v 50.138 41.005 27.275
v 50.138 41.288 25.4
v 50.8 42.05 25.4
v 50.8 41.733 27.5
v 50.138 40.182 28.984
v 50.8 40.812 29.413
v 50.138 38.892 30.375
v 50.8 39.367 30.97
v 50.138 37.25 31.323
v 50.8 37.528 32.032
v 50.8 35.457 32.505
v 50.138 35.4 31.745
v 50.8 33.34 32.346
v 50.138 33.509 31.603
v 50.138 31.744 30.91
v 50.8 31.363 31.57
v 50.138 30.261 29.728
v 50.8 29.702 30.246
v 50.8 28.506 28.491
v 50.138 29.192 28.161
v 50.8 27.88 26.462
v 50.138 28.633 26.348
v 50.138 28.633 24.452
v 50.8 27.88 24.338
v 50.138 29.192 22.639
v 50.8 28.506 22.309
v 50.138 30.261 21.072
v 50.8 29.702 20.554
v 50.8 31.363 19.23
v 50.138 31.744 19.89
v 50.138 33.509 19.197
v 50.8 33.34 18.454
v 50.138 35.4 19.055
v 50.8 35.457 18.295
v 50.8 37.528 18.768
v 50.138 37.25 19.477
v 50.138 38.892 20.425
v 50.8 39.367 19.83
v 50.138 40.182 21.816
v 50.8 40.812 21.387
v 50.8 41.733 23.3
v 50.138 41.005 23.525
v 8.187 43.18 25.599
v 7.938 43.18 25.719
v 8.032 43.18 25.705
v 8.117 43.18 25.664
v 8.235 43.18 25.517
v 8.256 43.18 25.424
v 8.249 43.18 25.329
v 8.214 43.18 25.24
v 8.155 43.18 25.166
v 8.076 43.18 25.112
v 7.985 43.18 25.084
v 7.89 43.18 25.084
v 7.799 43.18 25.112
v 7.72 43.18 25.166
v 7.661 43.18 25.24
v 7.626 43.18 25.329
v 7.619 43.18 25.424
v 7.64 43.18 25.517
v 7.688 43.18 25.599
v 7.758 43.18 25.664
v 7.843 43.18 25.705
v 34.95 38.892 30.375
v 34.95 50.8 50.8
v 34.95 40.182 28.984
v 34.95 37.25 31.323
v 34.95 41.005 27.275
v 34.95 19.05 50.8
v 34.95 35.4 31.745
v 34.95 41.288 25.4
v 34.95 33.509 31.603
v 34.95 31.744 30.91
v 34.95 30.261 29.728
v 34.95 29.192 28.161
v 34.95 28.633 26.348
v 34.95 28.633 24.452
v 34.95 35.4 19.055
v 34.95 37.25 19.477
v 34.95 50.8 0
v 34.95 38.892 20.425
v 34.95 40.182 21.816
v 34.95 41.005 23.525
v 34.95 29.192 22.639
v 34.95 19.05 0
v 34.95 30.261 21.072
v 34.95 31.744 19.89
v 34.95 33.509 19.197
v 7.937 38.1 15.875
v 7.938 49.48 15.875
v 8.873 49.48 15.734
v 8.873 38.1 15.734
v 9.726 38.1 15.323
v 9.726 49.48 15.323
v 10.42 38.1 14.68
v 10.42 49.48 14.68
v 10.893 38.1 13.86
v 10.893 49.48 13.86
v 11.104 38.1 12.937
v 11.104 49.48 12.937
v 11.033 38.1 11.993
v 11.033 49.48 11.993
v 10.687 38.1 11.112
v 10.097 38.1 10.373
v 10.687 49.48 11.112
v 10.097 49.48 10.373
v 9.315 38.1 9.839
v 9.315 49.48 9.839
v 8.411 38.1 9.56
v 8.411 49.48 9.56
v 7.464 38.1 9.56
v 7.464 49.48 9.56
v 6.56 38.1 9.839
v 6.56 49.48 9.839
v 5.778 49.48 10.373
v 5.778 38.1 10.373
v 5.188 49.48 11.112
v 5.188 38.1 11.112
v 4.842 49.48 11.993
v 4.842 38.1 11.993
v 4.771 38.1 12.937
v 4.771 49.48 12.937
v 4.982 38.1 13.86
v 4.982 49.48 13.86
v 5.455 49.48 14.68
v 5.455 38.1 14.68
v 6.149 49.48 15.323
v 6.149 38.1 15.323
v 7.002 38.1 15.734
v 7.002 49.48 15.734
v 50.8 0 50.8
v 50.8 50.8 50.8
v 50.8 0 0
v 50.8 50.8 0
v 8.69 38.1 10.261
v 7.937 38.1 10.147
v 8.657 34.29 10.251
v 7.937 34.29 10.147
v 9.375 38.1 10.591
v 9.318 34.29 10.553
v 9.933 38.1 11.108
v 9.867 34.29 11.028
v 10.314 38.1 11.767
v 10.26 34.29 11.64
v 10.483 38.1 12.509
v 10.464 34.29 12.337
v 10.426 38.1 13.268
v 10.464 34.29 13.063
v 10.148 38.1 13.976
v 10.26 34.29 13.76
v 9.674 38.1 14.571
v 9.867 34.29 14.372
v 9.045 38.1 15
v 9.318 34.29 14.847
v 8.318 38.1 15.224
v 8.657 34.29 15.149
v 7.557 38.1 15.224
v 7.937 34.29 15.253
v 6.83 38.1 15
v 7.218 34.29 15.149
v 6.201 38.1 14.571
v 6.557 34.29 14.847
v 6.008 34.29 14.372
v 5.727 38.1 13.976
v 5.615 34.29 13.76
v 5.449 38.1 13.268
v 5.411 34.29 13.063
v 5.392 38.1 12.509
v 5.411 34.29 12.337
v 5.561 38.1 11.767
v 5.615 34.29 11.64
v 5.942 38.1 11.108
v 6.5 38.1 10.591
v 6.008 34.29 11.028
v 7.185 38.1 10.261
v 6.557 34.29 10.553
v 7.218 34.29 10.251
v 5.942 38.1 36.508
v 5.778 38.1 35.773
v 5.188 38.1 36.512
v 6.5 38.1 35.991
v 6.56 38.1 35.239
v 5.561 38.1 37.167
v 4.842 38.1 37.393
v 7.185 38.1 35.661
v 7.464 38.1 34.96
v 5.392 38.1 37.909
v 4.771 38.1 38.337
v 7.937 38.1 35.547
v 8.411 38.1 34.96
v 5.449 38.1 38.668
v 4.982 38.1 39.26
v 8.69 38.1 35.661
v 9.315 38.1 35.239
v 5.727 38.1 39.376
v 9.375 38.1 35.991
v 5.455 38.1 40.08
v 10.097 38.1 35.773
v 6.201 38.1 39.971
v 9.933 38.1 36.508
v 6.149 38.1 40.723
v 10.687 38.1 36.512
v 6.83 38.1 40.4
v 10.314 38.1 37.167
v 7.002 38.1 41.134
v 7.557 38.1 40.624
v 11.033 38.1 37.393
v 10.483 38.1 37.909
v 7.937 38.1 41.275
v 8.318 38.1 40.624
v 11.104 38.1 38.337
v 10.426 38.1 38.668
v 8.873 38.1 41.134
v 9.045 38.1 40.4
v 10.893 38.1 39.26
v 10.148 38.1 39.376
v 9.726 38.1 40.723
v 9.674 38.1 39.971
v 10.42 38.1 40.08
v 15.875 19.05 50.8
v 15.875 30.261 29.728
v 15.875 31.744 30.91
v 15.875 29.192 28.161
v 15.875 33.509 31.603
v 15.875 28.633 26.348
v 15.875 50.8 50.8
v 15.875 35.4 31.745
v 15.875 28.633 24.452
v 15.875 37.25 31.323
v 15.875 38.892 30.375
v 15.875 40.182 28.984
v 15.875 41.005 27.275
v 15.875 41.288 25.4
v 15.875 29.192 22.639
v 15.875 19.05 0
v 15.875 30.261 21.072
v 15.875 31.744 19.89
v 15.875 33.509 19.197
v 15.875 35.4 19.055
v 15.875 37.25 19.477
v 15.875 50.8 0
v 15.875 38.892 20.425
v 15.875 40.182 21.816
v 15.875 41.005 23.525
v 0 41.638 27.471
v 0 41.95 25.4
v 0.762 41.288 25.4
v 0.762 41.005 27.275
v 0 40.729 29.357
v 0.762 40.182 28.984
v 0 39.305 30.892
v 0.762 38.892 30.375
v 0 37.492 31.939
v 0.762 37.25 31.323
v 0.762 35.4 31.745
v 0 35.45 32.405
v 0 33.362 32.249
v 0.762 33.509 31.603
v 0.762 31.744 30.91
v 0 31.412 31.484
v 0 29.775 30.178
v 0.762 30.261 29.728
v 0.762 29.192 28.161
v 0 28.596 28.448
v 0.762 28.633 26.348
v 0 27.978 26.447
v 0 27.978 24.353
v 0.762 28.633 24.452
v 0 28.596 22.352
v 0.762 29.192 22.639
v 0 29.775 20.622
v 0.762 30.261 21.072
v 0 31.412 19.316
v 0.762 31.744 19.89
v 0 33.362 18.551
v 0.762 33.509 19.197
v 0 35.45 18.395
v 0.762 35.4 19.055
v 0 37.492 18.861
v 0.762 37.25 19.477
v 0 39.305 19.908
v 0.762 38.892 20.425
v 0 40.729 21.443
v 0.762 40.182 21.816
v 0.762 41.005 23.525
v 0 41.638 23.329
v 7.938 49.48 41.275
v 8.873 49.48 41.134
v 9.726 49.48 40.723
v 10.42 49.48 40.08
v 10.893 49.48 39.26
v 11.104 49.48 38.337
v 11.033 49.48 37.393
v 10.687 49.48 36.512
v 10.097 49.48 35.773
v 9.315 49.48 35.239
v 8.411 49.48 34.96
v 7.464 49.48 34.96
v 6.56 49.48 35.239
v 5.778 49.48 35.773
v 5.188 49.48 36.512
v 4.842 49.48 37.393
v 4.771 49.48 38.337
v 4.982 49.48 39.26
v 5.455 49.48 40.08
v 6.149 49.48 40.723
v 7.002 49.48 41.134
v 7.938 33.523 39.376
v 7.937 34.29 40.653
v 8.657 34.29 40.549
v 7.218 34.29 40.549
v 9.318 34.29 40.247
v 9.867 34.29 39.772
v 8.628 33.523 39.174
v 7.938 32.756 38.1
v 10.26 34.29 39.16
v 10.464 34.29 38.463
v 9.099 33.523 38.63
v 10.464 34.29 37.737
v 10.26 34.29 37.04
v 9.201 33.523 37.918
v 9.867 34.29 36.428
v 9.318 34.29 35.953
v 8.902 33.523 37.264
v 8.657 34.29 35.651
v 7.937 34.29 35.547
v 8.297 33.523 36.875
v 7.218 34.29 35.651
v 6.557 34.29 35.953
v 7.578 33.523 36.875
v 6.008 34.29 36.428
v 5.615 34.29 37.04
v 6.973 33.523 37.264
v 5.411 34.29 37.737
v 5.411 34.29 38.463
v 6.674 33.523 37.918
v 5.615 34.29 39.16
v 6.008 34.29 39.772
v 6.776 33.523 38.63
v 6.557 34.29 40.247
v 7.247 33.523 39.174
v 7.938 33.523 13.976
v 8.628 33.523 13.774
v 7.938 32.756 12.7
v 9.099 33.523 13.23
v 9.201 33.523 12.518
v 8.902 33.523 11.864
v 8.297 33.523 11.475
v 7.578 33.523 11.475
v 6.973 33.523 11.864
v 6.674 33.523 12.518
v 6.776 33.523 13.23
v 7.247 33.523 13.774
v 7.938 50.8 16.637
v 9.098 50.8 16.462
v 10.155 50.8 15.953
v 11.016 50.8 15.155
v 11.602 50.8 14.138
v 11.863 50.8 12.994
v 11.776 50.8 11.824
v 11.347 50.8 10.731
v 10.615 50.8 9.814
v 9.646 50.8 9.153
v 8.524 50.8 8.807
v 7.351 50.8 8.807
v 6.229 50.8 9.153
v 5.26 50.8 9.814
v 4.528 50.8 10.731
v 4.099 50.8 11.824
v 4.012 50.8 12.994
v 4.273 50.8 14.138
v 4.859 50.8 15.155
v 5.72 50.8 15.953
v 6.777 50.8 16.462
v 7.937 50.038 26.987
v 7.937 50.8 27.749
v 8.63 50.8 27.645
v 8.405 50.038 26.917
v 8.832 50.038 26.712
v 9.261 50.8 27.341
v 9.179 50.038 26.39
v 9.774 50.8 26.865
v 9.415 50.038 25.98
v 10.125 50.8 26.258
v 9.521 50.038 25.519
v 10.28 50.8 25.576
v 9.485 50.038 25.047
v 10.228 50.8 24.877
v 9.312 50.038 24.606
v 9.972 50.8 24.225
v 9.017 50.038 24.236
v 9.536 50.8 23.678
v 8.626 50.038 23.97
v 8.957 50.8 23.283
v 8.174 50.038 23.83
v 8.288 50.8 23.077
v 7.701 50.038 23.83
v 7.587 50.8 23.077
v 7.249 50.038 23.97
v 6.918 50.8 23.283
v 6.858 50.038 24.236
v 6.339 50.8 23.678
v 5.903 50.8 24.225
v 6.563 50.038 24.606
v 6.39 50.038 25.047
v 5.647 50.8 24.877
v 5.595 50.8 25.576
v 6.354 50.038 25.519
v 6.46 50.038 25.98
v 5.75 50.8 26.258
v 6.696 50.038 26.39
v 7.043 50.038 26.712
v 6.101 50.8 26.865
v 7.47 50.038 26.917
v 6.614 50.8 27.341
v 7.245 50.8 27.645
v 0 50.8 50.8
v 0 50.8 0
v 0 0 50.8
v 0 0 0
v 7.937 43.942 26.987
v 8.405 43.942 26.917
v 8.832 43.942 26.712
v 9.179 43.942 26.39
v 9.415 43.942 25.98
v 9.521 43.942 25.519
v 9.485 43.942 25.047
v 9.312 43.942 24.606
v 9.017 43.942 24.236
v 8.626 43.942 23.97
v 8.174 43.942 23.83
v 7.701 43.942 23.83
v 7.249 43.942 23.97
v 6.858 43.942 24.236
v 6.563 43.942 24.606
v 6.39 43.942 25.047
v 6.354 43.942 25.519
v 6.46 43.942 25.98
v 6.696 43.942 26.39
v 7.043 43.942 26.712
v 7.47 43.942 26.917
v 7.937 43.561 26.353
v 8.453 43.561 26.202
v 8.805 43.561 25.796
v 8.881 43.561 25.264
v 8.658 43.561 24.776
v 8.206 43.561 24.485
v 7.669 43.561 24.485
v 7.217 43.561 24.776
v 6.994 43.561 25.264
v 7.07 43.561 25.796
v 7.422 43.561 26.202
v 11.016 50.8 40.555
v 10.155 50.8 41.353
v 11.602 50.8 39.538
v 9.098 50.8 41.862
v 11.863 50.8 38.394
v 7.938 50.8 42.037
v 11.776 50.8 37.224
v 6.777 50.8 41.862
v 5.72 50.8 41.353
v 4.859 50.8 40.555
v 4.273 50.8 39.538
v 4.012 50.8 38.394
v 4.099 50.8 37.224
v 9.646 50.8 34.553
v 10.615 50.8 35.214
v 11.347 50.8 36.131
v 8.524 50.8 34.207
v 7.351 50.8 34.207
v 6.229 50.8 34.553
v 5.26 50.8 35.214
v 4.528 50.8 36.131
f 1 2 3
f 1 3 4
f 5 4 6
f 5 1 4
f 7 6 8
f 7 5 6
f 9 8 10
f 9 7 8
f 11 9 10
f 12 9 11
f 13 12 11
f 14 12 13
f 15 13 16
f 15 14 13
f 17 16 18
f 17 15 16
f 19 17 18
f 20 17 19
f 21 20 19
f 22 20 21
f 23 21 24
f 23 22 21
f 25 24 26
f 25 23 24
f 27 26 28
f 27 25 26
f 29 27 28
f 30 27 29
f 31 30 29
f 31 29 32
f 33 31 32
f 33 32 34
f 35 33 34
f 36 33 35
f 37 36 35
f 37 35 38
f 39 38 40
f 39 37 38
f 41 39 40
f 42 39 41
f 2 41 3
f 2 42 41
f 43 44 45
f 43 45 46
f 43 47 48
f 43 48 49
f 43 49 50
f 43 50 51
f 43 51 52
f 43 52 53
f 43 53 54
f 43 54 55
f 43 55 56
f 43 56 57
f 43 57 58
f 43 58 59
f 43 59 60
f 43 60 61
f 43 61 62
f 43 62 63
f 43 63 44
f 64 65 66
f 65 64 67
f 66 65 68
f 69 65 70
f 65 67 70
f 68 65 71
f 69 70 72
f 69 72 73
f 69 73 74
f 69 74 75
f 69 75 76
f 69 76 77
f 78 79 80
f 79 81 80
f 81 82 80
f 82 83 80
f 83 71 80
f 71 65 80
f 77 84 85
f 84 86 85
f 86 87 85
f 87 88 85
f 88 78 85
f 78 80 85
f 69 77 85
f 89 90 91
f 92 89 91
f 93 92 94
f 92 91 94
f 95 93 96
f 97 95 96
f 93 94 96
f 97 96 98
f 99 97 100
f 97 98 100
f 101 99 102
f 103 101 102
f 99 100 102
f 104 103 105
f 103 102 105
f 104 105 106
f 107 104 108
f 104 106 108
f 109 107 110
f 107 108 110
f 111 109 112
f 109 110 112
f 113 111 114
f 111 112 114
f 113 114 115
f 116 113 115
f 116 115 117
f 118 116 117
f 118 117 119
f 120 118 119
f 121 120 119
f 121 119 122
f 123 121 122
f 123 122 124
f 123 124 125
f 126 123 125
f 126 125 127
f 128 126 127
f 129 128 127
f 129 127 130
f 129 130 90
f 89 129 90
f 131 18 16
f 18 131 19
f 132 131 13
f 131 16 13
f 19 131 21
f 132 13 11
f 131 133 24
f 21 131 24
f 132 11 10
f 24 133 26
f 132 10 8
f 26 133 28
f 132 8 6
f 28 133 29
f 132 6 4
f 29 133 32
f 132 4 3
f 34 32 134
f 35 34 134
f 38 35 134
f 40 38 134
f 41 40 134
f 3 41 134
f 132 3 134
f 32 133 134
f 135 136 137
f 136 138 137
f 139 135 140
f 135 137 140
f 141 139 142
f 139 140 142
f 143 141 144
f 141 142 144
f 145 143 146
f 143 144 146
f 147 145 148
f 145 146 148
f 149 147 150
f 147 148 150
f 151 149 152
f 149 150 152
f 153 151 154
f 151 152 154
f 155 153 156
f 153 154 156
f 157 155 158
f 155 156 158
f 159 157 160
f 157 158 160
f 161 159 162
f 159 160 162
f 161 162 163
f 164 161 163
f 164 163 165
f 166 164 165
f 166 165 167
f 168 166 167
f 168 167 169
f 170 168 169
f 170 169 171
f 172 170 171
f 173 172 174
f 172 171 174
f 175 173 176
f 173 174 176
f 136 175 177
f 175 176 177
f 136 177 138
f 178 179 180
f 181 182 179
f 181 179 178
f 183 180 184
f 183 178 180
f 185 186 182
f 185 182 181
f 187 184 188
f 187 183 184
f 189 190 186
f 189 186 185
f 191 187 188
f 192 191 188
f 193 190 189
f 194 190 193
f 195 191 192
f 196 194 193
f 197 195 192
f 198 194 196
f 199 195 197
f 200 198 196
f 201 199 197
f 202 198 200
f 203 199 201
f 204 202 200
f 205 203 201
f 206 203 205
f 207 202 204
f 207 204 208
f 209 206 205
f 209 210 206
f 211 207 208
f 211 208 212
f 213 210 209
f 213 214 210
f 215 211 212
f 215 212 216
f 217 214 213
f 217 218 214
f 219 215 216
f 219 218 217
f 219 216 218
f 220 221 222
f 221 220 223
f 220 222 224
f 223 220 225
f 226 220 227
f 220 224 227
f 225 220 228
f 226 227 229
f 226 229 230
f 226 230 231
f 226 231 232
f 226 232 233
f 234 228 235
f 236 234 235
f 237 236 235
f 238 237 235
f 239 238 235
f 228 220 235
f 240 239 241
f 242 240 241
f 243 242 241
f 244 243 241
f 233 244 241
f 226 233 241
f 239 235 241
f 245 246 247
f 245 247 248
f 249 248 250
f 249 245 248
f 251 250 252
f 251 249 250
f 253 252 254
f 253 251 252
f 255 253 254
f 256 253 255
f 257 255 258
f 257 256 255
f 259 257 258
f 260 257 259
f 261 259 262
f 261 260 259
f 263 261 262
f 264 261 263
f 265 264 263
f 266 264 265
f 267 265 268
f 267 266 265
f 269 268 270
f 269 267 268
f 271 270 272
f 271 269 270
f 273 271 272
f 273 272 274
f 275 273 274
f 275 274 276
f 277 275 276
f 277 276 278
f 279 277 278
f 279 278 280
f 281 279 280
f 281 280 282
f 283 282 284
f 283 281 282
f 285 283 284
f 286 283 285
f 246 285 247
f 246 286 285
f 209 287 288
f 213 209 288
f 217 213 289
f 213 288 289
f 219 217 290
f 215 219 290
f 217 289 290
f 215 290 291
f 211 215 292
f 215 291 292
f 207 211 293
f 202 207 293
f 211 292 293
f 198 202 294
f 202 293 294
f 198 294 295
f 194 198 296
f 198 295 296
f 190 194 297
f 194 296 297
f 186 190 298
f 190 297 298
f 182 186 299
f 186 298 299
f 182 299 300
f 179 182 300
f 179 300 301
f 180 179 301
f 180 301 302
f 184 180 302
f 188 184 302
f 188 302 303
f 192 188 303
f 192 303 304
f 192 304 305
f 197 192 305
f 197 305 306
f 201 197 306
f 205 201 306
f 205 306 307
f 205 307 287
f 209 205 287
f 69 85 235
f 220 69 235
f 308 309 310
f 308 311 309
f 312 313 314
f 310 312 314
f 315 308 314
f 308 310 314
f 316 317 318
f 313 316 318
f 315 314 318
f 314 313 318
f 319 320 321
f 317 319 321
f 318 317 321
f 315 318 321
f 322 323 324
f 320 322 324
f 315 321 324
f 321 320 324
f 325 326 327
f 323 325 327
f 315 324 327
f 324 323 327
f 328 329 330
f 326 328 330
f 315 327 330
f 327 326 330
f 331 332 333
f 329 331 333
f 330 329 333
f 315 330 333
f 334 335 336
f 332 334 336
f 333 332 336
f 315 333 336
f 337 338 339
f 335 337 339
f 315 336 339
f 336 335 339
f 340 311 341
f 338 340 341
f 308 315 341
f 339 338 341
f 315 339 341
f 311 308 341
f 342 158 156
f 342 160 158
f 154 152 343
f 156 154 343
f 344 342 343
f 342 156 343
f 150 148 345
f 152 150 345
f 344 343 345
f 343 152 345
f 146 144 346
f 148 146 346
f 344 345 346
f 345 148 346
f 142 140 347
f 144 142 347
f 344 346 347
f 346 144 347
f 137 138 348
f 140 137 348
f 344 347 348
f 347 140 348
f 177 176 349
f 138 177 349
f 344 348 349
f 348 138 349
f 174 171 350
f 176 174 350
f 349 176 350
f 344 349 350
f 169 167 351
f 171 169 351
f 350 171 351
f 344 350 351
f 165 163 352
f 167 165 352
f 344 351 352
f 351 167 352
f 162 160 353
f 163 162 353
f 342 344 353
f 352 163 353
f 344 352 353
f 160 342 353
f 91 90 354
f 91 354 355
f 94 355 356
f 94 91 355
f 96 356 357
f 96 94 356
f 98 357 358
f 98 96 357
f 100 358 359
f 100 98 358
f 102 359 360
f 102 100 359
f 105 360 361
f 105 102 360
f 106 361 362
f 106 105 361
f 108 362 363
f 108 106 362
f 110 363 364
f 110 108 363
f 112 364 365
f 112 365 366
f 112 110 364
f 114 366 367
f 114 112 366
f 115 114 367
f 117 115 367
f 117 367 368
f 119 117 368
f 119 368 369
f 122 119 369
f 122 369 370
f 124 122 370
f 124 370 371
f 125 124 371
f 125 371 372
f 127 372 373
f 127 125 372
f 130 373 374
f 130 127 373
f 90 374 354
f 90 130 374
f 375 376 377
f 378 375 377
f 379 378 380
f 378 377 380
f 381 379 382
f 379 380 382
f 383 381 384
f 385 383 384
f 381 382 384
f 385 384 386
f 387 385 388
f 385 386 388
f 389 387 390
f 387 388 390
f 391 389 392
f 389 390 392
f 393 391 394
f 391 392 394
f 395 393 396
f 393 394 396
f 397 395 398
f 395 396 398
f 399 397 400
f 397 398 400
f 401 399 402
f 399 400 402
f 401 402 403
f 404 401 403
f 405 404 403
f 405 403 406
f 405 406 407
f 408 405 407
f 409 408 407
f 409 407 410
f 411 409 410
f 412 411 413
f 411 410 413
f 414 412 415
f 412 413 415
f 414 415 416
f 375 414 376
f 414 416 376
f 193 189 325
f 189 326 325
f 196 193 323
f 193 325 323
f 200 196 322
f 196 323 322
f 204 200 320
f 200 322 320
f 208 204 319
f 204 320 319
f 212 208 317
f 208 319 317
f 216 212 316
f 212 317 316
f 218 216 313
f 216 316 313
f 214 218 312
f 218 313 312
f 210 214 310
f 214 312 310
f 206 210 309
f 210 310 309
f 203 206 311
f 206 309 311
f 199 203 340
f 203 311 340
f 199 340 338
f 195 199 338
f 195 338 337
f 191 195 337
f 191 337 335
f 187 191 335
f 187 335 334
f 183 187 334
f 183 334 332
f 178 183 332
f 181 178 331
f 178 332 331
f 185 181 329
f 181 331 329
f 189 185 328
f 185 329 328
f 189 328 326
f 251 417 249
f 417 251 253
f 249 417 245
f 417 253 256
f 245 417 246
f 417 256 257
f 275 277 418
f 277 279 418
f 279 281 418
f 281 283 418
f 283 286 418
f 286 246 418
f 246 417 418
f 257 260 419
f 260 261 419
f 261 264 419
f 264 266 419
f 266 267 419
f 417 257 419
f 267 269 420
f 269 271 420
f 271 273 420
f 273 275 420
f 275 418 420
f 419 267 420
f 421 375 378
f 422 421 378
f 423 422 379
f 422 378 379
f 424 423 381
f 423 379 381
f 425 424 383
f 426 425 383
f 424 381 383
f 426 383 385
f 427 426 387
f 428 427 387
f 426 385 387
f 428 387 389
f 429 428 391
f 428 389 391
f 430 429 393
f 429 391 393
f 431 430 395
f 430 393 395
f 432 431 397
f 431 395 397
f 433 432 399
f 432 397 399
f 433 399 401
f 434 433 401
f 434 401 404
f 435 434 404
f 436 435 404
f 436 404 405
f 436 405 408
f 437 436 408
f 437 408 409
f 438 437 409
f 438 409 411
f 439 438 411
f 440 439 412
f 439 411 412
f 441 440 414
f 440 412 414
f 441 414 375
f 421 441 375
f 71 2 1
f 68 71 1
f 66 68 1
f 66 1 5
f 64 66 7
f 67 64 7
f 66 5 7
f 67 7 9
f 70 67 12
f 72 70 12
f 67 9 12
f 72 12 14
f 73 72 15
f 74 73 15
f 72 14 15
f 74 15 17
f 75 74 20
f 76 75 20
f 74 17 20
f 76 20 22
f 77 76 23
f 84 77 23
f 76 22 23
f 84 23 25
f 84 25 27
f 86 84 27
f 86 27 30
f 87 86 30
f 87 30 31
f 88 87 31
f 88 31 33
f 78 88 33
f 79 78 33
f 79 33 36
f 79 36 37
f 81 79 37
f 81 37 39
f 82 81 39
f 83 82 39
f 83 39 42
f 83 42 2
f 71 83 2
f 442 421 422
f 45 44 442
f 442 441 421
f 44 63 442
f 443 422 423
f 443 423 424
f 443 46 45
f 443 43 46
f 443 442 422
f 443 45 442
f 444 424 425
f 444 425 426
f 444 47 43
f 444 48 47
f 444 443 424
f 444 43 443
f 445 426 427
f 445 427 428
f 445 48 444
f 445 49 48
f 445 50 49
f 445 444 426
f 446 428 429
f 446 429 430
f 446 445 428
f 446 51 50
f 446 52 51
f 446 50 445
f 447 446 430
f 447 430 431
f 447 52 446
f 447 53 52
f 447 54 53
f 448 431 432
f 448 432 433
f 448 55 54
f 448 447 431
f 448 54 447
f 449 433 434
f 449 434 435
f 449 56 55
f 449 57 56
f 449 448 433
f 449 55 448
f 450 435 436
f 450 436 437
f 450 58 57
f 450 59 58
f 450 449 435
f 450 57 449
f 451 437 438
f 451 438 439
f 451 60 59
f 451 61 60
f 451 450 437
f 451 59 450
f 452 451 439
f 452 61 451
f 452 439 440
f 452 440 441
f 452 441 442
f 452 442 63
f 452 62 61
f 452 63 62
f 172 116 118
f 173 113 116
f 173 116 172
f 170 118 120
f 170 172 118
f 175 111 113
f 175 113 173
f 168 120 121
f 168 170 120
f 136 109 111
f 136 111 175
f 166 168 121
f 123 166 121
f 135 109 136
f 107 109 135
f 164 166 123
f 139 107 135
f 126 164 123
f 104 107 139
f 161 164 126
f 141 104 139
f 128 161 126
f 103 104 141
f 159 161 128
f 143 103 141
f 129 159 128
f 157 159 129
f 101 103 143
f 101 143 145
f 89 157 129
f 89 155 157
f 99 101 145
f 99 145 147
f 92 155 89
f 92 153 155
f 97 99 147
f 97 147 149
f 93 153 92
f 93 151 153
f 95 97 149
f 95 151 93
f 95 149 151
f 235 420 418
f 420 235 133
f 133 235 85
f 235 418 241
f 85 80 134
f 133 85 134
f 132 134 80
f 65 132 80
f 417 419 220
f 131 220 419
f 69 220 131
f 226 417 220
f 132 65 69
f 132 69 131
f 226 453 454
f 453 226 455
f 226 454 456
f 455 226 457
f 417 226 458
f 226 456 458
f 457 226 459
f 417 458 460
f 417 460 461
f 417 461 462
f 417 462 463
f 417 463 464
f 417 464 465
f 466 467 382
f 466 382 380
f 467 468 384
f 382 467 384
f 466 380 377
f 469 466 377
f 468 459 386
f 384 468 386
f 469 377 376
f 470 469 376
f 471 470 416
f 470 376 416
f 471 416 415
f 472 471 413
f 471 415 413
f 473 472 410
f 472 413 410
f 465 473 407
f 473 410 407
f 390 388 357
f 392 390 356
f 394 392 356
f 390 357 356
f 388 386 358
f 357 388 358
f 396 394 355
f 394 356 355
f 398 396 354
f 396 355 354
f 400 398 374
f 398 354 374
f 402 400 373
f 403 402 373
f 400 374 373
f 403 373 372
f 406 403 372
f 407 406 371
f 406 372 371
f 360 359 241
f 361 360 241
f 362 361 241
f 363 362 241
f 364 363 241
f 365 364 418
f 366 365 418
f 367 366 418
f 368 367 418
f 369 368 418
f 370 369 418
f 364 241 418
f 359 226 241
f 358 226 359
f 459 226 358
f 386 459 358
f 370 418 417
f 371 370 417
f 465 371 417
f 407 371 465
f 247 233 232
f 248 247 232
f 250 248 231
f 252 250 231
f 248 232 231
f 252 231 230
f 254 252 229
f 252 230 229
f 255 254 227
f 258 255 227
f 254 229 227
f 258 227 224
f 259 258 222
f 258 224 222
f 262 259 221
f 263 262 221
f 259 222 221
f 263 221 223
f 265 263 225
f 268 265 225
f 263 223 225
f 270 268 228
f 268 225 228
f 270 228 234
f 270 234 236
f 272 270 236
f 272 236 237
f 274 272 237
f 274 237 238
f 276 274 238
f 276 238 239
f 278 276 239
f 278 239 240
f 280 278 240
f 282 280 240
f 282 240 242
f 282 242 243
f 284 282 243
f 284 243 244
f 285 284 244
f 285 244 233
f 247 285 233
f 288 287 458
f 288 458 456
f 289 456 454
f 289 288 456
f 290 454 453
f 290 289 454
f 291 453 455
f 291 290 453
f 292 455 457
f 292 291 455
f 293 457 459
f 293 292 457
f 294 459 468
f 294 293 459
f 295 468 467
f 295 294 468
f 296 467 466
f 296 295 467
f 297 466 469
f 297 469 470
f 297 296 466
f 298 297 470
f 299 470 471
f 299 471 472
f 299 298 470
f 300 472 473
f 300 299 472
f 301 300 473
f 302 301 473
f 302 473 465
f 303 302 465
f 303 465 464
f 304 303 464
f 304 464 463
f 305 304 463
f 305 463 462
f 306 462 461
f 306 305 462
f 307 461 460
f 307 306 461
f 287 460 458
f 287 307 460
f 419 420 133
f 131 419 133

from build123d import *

# Parameters (mm, degrees)
EXTRUDE1_DEPTH                    = 50.8
SKETCH3_R                         = 1.5875
CUT_EXTRUDE2_DEPTH                = 7.62
CHAMFER3_SIZE                     = 0.762
CHAMFER3_SIZE2                    = 1.268180966
CHAMFER4_SIZE                     = 0.762
SKETCH4_R                         = 6.3627
CUT_EXTRUDE3_DEPTH                = 51.8
F_1_4_20_TAPPED_HOLE1_D           = 5.1054
F_1_4_20_TAPPED_HOLE1_DEPTH       = 16.51
F_1_4_20_TAPPED_HOLE1_CBORE_D     = 6.35
F_1_4_20_TAPPED_HOLE1_CBORE_DEPTH = 12.7
F_1_4_20_TAPPED_HOLE1_TIP         = 1.533816902
CHAMFER6_SIZE                     = 0.762
CHAMFER6_SIZE2                    = 1.319822715
CHAMFER7_SIZE                     = 0.762
CHAMFER7_SIZE2                    = 0.662396494
CHAMFER7_PART_2_SIZE              = 0.762
CHAMFER7_PART_2_SIZE2             = 0.662396494


with BuildPart() as part:
    # Sketch1 → Extrude1 (new body)
    with BuildSketch(Plane.XY):
        Polygon((0, 0), (50.8, 0), (50.8, 50.8), (34.9504, 50.8), (34.9504, 19.05), (15.875, 19.05), (15.875, 50.8), (0, 50.8), align=None)
    extrude(amount=EXTRUDE1_DEPTH)

    # Sketch3 → Cut-Extrude2 (cut)
    with BuildSketch(Plane(origin=(0, 50.8, 0), x_dir=(-1, 0, 0), z_dir=(0, 1, 0))):
        with Locations(Location((-7.9375, 25.4, 0), (0, 0, 90))):  # turned: the seam where the file's is
            Circle(SKETCH3_R)
    extrude(amount=-CUT_EXTRUDE2_DEPTH, mode=Mode.SUBTRACT)

    # Chamfer3
    chamfer3_edges = [part.edges().sort_by_distance(p)[0] for p in [
        (7.9375, 43.18, 23.8125),
    ]]
    chamfer3_side = [part.faces().sort_by_distance(p)[0] for p in [
        (7.9375, 46.99, 23.8125),
    ]]
    chamfer(chamfer3_edges, length=CHAMFER3_SIZE, length2=CHAMFER3_SIZE2, reference=chamfer3_side[0])

    # Chamfer4
    chamfer4_edges = [part.edges().sort_by_distance(p)[0] for p in [
        (7.9375, 50.8, 23.8125),
    ]]
    chamfer(chamfer4_edges, length=CHAMFER4_SIZE)

    # Sketch4 → Cut-Extrude3 (cut, through all)
    with BuildSketch(Plane(origin=(50.8, 0, 0), x_dir=(0, 0, -1), z_dir=(1, 0, 0))):
        with Locations(Location((-25.4, 34.925, 0), (0, 0, 90))):  # turned: the seam where the file's is
            Circle(SKETCH4_R)
    extrude(amount=-CUT_EXTRUDE3_DEPTH, mode=Mode.SUBTRACT)

    # 1/4-20 Tapped Hole1
    with Locations(Plane(origin=(7.9375, 50.8, 12.7), x_dir=(0, 0, 1), z_dir=(0, 1, 0))):
        with Locations((0, 0), (25.4, 0)):
            CounterBoreHole(F_1_4_20_TAPPED_HOLE1_D / 2, F_1_4_20_TAPPED_HOLE1_CBORE_D / 2, F_1_4_20_TAPPED_HOLE1_CBORE_DEPTH, depth=F_1_4_20_TAPPED_HOLE1_DEPTH)
            with Locations((0, 0, -(F_1_4_20_TAPPED_HOLE1_DEPTH + F_1_4_20_TAPPED_HOLE1_TIP / 2))):  # 118° drill point
                Cone(0, F_1_4_20_TAPPED_HOLE1_D / 2, F_1_4_20_TAPPED_HOLE1_TIP, mode=Mode.SUBTRACT)

    # Chamfer6
    chamfer6_edges = [part.edges().sort_by_distance(p)[0] for p in [
        (7.9375, 50.8, 34.925),
        (7.9375, 50.8, 9.525),
    ]]
    chamfer6_side = [part.faces().sort_by_distance(p)[0] for p in [
        (15.342773016, 50.8, 25.4),
    ]]
    chamfer(chamfer6_edges, length=CHAMFER6_SIZE, length2=CHAMFER6_SIZE2, reference=chamfer6_side[0])

    # Chamfer7
    chamfer7_edges = [part.edges().sort_by_distance(p)[0] for p in [
        (0, 28.5623, 25.4),
    ]]
    chamfer7_side = [part.faces().sort_by_distance(p)[0] for p in [
        (7.9375, 28.5623, 25.4),
    ]]
    chamfer(chamfer7_edges, length=CHAMFER7_SIZE, length2=CHAMFER7_SIZE2, reference=chamfer7_side[0])

    # Chamfer7 part 2
    chamfer7_part_2_edges = [part.edges().sort_by_distance(p)[0] for p in [
        (50.8, 28.5623, 25.4),
    ]]
    chamfer7_part_2_side = [part.faces().sort_by_distance(p)[0] for p in [
        (50.8, 24.906235921, 25.4),
    ]]
    chamfer(chamfer7_part_2_edges, length=CHAMFER7_PART_2_SIZE, length2=CHAMFER7_PART_2_SIZE2, reference=chamfer7_part_2_side[0])


solid = part.part
